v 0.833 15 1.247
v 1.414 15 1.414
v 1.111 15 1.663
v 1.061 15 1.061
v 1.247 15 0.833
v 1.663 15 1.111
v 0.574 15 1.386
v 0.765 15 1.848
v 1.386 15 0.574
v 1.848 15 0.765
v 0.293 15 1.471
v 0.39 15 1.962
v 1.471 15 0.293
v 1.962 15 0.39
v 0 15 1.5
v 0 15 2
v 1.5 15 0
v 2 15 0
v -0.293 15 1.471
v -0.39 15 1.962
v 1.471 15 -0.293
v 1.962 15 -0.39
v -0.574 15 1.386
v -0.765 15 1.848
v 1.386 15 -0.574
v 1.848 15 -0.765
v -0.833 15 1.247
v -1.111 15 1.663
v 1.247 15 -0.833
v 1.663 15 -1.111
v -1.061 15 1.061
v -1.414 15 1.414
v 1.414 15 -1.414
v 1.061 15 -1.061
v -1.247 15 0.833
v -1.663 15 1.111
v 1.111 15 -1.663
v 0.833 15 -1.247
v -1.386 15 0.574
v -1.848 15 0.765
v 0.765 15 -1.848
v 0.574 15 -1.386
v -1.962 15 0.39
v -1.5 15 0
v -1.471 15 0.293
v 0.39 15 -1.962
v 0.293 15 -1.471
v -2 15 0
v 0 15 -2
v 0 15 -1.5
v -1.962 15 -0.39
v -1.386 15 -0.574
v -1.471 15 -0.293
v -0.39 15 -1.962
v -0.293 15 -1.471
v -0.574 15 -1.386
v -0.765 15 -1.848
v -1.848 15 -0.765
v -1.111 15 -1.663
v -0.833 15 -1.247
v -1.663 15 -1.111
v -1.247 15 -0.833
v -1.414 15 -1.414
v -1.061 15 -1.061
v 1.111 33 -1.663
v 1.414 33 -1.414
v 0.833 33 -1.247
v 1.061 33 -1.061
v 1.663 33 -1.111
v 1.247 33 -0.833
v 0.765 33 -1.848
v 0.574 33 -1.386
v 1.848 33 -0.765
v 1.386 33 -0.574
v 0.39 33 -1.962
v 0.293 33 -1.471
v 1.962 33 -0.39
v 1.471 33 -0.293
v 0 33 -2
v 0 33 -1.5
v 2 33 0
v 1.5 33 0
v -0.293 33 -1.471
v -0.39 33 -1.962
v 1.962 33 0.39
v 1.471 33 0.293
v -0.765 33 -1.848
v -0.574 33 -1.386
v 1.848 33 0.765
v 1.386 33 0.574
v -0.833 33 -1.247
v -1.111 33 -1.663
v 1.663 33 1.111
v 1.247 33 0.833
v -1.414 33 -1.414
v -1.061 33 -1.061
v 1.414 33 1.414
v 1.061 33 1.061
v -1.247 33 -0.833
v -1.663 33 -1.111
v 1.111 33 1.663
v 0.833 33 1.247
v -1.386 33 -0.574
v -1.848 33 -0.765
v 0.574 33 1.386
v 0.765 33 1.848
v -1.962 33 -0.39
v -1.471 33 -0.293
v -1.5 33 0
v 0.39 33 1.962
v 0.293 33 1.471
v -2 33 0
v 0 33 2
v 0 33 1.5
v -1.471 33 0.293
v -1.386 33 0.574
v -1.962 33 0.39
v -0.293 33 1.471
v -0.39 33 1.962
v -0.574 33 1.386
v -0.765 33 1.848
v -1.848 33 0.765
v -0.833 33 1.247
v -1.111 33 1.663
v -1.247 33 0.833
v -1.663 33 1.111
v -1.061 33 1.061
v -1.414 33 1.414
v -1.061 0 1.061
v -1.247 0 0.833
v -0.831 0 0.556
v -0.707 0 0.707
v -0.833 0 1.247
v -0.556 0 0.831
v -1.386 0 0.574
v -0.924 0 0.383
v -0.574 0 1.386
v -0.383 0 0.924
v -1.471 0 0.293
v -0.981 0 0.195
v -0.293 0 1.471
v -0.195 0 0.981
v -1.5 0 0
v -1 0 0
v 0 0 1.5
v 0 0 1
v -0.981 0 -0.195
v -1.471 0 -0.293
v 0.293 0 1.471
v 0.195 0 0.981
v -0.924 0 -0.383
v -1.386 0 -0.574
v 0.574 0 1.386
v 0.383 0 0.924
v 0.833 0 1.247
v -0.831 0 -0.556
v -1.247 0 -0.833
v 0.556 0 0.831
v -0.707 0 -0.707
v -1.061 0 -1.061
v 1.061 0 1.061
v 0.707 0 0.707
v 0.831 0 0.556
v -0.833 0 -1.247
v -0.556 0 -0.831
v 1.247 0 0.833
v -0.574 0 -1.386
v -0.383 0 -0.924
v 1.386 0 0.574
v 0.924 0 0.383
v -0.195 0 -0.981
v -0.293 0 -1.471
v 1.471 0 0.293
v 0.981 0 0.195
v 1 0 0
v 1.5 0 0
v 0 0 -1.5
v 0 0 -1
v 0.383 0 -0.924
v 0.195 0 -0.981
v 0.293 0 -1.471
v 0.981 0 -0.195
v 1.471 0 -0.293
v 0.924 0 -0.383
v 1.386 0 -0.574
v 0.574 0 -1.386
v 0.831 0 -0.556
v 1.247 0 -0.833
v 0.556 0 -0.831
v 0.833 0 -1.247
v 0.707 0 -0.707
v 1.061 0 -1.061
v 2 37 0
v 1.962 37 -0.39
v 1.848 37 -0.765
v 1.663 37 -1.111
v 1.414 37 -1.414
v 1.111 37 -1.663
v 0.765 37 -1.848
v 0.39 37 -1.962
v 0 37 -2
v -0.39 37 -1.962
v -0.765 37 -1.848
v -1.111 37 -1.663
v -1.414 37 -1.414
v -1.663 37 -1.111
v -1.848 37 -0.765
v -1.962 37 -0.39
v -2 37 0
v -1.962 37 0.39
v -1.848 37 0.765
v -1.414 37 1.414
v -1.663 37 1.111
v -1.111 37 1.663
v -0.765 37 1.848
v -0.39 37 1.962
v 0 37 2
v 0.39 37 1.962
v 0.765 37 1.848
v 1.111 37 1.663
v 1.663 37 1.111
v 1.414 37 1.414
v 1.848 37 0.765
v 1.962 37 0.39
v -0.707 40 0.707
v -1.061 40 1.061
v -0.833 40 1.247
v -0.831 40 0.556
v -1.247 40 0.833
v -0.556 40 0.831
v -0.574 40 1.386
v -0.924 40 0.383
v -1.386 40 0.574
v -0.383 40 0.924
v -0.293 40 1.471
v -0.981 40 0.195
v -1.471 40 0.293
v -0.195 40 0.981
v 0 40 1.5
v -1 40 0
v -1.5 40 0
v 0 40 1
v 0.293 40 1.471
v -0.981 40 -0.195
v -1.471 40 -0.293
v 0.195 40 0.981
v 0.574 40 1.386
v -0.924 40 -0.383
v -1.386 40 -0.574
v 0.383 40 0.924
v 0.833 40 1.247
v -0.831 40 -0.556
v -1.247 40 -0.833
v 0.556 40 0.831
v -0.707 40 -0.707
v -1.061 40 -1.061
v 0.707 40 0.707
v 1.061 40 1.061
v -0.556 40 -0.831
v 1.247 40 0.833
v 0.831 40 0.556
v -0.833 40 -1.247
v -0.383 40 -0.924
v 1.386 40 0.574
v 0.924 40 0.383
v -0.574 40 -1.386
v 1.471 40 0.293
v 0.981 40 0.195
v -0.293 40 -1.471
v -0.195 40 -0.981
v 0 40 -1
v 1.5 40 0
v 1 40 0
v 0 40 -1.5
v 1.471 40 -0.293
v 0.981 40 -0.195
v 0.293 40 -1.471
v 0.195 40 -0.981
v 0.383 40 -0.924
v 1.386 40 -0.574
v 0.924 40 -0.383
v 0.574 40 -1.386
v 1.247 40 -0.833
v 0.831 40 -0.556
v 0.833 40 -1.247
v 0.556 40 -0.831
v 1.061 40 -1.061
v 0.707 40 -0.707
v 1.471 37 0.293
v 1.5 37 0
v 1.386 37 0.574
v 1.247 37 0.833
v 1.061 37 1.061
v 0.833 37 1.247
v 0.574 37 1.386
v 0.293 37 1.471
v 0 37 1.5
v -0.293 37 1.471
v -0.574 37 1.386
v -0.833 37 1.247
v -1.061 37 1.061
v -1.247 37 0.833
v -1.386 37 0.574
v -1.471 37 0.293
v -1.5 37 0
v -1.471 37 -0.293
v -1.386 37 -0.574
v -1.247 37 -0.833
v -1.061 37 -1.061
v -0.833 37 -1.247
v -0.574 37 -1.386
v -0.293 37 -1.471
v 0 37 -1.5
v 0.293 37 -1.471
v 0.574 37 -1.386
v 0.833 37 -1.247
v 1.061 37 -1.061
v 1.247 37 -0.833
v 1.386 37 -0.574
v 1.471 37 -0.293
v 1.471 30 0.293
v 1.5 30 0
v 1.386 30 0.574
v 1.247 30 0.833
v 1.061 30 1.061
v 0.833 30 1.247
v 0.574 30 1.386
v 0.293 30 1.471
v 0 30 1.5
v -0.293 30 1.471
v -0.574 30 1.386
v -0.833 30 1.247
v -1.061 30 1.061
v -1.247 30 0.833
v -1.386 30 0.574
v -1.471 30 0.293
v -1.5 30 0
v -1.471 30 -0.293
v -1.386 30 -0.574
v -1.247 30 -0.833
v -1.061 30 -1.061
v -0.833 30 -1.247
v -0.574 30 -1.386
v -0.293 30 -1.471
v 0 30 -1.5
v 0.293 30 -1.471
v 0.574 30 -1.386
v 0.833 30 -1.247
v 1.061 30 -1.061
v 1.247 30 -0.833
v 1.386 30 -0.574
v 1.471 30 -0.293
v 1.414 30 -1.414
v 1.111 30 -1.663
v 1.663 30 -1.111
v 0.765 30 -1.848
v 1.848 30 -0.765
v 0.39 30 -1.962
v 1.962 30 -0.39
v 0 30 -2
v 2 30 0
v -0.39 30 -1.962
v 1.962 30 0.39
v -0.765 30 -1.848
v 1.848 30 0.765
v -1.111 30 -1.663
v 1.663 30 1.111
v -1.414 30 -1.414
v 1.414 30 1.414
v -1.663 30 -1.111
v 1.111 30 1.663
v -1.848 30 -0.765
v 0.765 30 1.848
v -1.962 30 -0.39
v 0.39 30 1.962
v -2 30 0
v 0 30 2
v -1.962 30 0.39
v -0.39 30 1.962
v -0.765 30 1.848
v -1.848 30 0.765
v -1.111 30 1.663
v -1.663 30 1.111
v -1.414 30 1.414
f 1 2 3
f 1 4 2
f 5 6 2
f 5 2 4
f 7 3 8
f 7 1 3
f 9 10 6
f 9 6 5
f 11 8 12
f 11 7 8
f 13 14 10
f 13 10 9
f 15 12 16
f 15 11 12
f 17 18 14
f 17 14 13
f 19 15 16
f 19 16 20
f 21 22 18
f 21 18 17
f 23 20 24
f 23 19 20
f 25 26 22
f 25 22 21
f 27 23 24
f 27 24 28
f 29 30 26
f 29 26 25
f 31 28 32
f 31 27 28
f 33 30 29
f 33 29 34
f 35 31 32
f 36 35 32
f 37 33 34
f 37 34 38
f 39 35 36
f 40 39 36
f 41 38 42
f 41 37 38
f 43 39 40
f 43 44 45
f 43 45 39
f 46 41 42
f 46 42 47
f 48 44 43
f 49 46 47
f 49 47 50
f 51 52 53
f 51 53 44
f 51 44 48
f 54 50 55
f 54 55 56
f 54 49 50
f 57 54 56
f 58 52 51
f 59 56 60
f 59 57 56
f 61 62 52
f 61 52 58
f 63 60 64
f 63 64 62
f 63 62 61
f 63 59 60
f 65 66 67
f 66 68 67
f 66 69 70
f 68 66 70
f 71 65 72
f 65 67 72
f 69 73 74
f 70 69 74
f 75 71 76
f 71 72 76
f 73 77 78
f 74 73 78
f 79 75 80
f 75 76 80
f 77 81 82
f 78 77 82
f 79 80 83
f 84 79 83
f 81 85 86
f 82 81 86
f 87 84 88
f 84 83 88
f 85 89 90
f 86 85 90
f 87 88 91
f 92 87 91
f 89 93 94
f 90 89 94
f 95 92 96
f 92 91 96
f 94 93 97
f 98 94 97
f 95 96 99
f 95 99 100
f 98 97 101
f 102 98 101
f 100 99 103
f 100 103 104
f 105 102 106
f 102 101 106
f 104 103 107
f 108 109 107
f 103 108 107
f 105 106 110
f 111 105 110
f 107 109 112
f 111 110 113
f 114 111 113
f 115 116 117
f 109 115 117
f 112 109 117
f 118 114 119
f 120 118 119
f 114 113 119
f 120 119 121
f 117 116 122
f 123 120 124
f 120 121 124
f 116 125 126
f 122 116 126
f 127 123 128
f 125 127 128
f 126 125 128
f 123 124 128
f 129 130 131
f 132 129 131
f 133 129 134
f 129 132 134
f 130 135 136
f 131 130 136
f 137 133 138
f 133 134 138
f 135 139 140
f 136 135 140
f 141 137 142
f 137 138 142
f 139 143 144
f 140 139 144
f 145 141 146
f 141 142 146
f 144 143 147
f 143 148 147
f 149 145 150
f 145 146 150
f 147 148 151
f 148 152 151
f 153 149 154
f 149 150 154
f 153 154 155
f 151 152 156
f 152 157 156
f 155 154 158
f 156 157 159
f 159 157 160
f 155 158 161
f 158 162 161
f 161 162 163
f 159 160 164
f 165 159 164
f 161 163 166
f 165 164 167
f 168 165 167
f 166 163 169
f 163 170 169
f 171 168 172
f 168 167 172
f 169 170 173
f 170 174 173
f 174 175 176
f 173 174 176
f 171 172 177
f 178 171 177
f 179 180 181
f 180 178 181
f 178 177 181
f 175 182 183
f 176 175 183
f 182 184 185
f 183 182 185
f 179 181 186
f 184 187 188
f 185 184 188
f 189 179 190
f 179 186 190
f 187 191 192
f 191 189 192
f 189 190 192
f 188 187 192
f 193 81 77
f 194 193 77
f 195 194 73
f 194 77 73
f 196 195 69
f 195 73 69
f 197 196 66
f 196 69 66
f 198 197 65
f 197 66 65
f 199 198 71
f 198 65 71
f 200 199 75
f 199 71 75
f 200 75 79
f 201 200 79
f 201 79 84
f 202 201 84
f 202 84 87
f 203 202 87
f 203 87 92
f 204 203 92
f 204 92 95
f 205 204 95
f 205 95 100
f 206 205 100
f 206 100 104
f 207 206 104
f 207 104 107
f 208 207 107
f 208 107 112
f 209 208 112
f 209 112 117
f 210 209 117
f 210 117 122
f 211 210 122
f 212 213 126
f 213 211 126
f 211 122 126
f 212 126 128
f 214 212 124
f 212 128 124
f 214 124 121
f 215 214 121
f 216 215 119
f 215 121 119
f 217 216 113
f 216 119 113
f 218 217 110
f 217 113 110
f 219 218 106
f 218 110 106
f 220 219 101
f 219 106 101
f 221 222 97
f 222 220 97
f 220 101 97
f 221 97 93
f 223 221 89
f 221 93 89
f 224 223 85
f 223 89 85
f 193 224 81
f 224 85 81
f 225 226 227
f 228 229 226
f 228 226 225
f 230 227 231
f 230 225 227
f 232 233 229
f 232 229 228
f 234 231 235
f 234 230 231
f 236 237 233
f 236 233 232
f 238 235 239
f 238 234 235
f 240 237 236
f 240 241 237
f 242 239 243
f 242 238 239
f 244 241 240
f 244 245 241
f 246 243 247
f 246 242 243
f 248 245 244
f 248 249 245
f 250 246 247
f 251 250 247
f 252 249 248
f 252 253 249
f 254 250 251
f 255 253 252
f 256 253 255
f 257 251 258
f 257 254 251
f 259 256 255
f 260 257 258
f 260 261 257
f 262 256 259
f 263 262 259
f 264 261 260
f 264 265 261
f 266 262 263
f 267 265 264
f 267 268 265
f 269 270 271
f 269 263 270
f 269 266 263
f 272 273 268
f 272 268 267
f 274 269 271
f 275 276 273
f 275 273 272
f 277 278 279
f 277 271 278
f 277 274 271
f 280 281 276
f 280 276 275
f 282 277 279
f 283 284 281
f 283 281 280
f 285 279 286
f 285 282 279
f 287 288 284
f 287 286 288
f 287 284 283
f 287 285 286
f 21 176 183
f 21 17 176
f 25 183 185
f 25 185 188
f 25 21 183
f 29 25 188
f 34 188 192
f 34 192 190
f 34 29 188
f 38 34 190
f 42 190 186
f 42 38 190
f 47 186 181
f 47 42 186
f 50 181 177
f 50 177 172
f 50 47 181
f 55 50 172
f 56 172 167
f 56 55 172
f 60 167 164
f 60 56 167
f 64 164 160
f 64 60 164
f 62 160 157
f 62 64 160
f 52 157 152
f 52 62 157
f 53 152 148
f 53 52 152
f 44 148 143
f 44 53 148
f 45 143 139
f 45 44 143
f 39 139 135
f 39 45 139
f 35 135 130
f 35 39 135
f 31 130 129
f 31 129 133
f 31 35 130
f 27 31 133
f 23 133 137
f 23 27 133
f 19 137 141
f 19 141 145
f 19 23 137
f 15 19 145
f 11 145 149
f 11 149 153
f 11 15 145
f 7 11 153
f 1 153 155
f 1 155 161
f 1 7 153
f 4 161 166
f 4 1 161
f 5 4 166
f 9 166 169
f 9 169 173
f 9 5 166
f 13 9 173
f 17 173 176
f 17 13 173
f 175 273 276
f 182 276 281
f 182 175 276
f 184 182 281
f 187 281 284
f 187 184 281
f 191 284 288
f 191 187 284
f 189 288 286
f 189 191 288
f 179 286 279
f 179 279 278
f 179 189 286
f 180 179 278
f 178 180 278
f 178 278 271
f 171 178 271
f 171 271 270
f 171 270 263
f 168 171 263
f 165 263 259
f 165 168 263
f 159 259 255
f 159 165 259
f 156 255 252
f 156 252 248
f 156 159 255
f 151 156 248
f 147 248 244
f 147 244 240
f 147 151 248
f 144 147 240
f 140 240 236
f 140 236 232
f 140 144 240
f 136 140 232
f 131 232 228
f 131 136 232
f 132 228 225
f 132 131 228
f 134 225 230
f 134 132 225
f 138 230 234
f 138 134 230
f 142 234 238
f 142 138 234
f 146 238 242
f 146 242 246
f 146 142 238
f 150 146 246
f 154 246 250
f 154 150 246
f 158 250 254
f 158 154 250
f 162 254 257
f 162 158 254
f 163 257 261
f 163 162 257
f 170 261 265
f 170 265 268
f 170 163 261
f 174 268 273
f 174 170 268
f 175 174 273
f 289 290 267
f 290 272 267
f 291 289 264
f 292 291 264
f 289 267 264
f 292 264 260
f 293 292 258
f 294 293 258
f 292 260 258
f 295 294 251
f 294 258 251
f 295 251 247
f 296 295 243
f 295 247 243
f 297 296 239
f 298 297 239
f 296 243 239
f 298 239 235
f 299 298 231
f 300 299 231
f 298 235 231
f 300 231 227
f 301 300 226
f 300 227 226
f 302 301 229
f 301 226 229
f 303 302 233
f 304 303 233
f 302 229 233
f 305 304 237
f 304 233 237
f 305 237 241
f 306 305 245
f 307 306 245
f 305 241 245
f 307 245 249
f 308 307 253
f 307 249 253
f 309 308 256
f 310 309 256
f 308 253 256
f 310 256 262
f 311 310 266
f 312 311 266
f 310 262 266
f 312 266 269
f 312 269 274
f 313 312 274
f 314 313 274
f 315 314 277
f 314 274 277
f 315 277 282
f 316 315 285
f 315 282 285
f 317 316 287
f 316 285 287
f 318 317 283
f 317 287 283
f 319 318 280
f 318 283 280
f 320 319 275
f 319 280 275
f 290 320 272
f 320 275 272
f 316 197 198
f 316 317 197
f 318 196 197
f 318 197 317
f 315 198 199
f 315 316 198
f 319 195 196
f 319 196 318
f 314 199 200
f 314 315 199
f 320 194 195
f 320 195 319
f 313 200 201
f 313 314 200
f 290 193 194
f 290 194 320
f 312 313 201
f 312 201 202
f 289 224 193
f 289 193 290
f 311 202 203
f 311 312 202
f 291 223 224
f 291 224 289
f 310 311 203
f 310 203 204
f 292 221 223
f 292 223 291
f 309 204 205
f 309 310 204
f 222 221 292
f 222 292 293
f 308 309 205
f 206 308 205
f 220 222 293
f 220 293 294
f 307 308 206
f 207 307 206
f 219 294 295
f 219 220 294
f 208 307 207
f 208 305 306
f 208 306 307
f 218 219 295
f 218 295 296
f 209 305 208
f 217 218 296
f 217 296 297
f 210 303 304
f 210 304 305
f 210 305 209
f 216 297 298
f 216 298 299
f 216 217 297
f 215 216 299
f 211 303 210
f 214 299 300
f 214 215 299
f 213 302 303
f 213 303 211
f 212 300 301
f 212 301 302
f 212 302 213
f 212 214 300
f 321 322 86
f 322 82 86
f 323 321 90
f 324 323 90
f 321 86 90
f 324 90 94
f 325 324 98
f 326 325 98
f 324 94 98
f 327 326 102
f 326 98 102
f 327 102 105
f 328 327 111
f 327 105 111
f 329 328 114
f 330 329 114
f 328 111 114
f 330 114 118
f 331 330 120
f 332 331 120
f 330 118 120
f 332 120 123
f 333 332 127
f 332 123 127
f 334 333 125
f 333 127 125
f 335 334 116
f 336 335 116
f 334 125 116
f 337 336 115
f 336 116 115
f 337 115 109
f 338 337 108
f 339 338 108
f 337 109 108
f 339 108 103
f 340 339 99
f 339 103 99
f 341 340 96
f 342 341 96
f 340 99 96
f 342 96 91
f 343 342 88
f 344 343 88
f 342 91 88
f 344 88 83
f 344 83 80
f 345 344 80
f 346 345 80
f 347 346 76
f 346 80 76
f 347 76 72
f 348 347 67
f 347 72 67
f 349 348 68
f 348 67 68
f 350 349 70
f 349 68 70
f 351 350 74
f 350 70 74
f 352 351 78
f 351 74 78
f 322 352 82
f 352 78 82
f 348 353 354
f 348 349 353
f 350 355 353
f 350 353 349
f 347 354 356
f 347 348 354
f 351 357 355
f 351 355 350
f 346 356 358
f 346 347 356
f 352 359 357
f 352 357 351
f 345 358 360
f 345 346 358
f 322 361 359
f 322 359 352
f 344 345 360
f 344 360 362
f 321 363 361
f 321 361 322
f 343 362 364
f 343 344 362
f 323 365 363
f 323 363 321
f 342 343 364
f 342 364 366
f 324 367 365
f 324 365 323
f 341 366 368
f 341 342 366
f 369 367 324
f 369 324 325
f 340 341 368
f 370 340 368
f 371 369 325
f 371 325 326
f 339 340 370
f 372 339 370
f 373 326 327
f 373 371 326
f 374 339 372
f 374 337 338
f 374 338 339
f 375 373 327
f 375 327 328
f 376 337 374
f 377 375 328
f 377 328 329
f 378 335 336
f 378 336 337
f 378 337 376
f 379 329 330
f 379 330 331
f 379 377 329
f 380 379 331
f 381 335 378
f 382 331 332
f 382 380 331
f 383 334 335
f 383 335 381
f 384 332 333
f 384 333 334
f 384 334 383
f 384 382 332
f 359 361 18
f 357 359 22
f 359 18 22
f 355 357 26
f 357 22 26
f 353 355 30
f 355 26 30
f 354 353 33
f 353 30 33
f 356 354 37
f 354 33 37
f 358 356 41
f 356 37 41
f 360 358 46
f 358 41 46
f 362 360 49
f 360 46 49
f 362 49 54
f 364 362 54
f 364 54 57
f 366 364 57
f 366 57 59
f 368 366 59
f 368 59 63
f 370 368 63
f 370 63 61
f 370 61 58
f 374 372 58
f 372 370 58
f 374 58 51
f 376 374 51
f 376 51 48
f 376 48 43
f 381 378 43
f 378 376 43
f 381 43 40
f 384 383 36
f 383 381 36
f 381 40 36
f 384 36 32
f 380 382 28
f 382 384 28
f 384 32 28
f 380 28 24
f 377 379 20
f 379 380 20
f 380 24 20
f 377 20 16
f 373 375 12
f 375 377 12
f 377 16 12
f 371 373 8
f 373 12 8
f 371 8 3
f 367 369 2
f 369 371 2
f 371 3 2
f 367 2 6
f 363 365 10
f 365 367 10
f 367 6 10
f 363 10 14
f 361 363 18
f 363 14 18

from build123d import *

# Parameters (mm, degrees)
SKETCH_1_R      = 2
SKETCH_1_R_2    = 1
EXTRUDE_1_DEPTH = 40
SKETCH_2_W      = 0.5
SKETCH_2_H      = 3
SKETCH_3_W      = 0.5
SKETCH_3_H      = 15


with BuildPart() as part:
    # Эскиз1 → Бобышка-Вытянуть1 (new body)
    with BuildSketch(Plane(origin=(0, 0, 0), x_dir=(1, 0, 0), z_dir=(0, 1, 0))):
        Circle(SKETCH_1_R)
        Circle(SKETCH_1_R_2, mode=Mode.SUBTRACT)
    extrude(amount=EXTRUDE_1_DEPTH)

    # Эскиз2 → Вырез-Повернуть1 (revolve, cut)
    with BuildSketch(Plane.XY):
        with Locations((1.75, 38.5)):
            Rectangle(SKETCH_2_W, SKETCH_2_H)
        with Locations((1.75, 31.5)):
            Rectangle(SKETCH_2_W, SKETCH_2_H)
    revolve(axis=Axis((0, 40, 0), (0, -1, 0)), mode=Mode.SUBTRACT)

    # Эскиз3 → Вырез-Повернуть2 (revolve, cut)
    with BuildSketch(Plane.XY):
        with Locations((1.75, 7.5)):
            Rectangle(SKETCH_3_W, SKETCH_3_H)
    revolve(axis=Axis((0, 0, 0), (0, 1, 0)), mode=Mode.SUBTRACT)


solid = part.part
